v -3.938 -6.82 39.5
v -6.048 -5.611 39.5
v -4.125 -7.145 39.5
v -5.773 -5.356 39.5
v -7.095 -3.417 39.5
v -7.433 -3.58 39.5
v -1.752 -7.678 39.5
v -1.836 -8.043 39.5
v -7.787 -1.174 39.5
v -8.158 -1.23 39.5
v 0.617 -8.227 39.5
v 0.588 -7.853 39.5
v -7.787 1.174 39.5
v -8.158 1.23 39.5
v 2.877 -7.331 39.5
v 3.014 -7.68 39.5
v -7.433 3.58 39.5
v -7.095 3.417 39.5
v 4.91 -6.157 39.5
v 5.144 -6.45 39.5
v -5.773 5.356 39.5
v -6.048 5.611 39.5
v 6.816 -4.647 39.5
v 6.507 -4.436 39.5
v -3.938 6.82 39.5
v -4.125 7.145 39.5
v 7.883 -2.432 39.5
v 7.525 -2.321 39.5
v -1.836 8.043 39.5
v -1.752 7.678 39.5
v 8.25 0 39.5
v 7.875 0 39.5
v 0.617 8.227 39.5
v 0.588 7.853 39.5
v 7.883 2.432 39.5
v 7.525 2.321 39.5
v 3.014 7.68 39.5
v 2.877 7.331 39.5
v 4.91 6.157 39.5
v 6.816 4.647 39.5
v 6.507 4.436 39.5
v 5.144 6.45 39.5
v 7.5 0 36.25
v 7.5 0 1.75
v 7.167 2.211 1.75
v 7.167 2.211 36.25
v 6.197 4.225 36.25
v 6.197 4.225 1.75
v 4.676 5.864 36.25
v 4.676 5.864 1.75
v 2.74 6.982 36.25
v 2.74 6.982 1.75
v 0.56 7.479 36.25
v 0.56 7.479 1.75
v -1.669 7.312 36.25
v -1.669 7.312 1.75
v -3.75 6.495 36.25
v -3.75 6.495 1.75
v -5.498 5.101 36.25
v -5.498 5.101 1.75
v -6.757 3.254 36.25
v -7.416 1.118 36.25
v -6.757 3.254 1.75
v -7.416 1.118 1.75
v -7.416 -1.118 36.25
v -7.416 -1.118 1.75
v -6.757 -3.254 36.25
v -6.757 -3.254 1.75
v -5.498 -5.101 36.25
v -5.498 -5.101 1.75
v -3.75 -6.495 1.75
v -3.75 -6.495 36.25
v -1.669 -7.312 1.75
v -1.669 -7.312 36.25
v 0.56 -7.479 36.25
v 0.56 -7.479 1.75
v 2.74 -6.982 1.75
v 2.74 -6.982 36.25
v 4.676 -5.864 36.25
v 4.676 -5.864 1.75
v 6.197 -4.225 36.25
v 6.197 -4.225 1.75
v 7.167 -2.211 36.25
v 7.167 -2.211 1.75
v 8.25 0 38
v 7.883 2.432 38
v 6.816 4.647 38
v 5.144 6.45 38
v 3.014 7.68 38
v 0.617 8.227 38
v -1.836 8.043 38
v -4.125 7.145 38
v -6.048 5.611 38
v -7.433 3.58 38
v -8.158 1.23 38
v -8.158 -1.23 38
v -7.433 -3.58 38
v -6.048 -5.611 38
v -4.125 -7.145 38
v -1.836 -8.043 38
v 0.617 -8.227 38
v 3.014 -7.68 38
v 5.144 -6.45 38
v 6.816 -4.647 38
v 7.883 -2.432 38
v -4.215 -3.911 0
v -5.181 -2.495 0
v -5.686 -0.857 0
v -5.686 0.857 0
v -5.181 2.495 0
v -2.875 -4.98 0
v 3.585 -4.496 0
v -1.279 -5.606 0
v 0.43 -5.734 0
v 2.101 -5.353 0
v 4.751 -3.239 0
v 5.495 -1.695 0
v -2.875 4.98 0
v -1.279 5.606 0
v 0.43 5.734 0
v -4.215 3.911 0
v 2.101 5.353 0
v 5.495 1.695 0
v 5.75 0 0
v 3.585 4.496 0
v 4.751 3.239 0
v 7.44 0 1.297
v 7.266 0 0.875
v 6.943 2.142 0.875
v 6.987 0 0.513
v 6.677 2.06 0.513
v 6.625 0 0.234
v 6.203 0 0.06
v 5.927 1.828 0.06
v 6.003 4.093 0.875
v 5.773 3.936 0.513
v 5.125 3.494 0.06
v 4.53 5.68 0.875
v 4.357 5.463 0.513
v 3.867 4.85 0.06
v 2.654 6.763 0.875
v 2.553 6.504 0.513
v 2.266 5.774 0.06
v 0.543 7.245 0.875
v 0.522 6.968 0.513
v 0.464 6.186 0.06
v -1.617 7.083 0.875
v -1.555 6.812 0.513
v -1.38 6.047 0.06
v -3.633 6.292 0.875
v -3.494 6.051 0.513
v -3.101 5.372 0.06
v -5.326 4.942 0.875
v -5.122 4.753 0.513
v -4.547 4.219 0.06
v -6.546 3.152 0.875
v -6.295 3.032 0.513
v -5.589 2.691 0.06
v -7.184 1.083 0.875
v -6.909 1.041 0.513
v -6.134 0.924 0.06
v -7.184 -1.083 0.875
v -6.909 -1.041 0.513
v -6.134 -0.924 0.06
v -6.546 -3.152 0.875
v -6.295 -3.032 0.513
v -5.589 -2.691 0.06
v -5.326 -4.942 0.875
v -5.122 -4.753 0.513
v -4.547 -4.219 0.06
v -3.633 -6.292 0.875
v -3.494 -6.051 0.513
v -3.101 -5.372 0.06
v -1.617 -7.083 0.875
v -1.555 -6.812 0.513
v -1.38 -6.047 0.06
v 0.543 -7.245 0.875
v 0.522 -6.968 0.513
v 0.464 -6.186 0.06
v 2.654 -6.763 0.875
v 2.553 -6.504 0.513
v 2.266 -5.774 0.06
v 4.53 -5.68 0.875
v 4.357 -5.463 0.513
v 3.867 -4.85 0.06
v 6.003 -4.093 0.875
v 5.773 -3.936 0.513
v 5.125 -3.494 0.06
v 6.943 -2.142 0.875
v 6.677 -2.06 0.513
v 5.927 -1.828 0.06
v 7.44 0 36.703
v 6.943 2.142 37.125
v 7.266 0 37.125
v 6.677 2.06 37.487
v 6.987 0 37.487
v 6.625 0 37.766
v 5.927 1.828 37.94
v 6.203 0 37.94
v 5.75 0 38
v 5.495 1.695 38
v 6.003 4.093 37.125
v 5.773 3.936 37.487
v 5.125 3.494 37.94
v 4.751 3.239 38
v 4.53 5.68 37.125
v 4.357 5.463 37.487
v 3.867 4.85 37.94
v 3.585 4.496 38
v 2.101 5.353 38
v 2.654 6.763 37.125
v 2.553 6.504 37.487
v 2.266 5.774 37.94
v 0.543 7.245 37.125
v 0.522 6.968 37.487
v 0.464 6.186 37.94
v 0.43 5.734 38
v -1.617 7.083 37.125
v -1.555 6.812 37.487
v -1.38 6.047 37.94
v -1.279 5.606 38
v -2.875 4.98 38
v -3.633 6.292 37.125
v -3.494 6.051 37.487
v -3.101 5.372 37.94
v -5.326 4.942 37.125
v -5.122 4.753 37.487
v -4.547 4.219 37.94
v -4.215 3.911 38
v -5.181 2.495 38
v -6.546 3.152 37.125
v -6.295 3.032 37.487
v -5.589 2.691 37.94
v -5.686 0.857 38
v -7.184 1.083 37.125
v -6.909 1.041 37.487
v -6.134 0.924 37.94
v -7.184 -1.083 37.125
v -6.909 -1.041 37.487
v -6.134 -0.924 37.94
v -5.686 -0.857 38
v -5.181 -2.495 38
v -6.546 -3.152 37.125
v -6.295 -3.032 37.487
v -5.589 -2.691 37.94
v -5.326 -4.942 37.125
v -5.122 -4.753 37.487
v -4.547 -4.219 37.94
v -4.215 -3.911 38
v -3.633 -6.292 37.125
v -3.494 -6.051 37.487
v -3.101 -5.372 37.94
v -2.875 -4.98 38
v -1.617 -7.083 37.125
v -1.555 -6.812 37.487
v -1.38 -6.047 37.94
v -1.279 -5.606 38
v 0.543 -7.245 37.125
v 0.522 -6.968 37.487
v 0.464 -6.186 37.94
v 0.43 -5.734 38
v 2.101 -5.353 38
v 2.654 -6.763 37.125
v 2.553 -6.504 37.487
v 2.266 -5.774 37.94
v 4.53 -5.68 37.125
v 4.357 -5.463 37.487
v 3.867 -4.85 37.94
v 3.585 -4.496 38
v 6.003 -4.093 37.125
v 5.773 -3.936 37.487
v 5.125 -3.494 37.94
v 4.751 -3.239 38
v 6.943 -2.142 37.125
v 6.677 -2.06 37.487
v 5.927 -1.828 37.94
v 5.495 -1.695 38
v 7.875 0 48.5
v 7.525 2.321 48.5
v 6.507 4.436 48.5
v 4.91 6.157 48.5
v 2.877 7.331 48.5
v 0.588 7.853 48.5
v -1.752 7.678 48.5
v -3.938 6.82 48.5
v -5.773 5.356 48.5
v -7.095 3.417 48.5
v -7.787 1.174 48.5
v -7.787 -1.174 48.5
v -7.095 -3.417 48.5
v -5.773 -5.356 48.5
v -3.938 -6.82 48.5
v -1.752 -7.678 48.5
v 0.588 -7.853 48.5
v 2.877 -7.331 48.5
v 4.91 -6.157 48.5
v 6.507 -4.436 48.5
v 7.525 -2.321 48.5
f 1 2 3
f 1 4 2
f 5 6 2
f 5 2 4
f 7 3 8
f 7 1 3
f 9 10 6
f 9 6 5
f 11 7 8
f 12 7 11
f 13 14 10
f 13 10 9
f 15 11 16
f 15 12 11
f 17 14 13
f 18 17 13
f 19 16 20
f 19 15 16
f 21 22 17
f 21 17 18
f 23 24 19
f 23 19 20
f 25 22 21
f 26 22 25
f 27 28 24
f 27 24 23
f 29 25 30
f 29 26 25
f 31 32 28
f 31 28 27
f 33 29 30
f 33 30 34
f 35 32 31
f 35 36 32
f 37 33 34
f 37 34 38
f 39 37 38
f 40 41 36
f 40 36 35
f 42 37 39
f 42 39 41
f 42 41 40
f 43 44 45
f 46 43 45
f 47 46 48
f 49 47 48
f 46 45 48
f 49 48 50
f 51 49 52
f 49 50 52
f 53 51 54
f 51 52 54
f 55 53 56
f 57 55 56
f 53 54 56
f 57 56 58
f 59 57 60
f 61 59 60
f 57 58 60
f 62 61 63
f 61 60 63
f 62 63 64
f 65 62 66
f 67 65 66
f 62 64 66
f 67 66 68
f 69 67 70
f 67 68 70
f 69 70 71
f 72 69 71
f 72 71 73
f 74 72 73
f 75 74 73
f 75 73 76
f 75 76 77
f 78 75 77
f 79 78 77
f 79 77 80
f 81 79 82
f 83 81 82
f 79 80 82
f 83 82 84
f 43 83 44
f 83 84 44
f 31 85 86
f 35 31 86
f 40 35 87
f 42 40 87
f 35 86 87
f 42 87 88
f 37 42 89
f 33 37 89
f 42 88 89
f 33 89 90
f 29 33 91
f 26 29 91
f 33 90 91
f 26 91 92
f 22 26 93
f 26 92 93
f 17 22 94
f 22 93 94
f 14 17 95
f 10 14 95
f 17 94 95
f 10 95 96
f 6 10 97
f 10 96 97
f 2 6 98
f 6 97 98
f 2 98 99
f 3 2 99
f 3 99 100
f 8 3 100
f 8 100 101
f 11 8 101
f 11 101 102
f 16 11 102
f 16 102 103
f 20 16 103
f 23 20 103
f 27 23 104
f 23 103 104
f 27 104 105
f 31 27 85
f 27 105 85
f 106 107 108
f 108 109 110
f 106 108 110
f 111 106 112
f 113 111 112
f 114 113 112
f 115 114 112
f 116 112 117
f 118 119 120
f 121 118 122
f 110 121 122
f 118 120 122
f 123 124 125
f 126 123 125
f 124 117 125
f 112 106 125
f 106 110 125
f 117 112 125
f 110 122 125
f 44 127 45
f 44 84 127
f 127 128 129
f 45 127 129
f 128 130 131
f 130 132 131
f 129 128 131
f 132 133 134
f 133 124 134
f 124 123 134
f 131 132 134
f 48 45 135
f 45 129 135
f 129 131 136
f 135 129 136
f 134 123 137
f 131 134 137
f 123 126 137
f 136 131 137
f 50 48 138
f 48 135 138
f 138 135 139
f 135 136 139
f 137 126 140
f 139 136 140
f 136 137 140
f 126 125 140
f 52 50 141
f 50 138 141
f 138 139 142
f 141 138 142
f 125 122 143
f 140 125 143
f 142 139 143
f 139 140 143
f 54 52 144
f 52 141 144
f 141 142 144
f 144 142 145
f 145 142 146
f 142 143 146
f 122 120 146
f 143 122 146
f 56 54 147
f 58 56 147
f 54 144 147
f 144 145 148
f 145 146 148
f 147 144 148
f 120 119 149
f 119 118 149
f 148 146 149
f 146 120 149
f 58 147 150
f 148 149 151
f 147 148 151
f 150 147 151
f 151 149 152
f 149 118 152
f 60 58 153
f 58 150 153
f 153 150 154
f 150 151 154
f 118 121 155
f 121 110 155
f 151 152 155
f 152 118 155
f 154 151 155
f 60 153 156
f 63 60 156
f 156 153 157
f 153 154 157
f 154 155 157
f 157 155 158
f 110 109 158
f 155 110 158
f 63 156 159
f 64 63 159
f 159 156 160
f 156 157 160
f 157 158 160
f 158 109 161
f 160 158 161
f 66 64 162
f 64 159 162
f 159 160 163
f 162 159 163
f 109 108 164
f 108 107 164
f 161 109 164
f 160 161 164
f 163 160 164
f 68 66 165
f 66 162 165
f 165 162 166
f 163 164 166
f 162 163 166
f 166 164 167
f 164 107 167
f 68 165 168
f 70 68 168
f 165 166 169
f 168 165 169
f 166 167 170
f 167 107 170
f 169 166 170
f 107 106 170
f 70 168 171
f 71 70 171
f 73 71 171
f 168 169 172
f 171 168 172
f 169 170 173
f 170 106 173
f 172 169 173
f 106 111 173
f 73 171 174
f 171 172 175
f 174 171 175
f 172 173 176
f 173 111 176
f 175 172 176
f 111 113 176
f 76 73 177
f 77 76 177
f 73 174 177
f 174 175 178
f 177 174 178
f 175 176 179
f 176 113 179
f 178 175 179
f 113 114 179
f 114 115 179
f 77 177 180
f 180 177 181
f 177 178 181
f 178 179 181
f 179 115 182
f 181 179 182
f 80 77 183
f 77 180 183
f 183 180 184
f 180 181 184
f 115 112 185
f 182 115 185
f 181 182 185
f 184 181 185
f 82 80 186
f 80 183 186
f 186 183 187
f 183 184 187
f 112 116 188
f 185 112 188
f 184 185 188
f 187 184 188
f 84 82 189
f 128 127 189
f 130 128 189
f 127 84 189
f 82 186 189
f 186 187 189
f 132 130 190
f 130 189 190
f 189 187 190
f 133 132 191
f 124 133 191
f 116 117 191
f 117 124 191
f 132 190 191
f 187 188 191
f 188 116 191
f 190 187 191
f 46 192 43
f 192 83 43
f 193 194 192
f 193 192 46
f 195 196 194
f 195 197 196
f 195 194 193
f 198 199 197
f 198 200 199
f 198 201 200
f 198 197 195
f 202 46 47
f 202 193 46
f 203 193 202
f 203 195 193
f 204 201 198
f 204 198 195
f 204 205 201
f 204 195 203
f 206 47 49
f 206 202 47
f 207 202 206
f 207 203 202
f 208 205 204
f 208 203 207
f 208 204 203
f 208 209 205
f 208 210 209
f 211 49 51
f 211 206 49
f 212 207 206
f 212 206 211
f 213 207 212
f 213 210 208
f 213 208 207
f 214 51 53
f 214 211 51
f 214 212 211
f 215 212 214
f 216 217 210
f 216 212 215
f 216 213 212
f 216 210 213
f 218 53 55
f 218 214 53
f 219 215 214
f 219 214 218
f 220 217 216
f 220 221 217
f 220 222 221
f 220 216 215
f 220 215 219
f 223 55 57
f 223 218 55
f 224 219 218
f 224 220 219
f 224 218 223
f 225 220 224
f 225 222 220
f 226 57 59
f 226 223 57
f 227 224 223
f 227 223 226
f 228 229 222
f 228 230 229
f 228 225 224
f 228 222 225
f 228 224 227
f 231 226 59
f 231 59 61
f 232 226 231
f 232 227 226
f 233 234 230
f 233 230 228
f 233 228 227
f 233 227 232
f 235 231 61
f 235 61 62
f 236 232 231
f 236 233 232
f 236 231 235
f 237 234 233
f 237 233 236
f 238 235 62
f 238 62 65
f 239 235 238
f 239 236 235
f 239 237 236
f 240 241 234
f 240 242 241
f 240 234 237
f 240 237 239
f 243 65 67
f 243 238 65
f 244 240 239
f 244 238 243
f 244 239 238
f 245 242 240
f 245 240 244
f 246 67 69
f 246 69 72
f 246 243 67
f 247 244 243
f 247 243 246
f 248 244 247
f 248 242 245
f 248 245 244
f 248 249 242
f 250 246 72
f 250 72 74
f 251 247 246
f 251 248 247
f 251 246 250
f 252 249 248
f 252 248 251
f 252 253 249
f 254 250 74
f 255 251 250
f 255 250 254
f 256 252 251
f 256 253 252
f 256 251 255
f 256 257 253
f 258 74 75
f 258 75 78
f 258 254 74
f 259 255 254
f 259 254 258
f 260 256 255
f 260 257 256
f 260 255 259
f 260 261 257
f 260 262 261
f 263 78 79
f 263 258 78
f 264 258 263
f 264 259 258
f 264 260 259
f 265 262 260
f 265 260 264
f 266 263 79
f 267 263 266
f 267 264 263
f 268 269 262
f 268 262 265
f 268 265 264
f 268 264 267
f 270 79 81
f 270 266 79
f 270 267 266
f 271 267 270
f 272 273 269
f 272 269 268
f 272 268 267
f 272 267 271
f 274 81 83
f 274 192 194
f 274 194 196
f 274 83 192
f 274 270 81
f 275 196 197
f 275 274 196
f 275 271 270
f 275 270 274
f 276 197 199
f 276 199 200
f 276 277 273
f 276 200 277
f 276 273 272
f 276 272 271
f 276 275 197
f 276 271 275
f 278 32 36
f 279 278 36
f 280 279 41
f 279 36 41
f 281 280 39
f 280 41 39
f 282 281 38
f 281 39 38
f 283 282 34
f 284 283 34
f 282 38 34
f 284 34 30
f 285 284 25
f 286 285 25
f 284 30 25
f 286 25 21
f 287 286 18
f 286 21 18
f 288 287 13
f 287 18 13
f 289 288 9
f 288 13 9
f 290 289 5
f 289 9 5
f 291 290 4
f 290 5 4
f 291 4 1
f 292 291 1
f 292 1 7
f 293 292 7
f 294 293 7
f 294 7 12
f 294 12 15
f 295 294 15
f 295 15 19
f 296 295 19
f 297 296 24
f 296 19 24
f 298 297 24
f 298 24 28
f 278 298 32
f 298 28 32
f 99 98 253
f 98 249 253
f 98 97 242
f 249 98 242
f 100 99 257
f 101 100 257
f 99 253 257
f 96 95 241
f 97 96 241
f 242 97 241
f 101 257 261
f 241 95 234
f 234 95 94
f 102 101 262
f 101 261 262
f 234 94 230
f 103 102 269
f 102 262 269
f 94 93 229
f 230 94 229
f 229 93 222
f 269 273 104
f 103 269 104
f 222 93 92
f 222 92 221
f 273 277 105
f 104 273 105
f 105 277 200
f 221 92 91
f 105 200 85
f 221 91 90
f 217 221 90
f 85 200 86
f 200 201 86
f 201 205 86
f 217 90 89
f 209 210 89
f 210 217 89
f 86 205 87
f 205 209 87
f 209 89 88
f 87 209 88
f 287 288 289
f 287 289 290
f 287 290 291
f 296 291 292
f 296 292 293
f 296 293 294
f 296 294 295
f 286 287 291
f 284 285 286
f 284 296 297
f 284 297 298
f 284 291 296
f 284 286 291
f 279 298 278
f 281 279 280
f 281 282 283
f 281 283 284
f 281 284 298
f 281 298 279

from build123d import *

# Parameters (mm, degrees)
F0_R     = 7.5
F1_DEPTH = 38
F3_R     = 1.75
F4_R     = 8.25
F5_DEPTH = 1.5
F6_R     = 7.875
F7_DEPTH = 9


with BuildPart() as f1:
    # F0 (on Top) → F1 (new body)
    with BuildSketch(Plane.XY):
        Circle(F0_R)
    extrude(amount=F1_DEPTH)

    # F3
    f3_edges = [f1.edges().sort_by_distance(p)[0] for p in [
        (-7.5, 0, 38),
        (-7.5, 0, 0),
    ]]
    fillet(f3_edges, radius=F3_R)

    # F4 (on face) → F5 (join)
    with BuildSketch(Plane.XY.offset(38)):
        Circle(F4_R)
    extrude(amount=F5_DEPTH)

    # F6 (on face) → F7 (join)
    with BuildSketch(Plane.XY.offset(39.5)):
        Circle(F6_R)
    extrude(amount=F7_DEPTH)


solid = f1.part
